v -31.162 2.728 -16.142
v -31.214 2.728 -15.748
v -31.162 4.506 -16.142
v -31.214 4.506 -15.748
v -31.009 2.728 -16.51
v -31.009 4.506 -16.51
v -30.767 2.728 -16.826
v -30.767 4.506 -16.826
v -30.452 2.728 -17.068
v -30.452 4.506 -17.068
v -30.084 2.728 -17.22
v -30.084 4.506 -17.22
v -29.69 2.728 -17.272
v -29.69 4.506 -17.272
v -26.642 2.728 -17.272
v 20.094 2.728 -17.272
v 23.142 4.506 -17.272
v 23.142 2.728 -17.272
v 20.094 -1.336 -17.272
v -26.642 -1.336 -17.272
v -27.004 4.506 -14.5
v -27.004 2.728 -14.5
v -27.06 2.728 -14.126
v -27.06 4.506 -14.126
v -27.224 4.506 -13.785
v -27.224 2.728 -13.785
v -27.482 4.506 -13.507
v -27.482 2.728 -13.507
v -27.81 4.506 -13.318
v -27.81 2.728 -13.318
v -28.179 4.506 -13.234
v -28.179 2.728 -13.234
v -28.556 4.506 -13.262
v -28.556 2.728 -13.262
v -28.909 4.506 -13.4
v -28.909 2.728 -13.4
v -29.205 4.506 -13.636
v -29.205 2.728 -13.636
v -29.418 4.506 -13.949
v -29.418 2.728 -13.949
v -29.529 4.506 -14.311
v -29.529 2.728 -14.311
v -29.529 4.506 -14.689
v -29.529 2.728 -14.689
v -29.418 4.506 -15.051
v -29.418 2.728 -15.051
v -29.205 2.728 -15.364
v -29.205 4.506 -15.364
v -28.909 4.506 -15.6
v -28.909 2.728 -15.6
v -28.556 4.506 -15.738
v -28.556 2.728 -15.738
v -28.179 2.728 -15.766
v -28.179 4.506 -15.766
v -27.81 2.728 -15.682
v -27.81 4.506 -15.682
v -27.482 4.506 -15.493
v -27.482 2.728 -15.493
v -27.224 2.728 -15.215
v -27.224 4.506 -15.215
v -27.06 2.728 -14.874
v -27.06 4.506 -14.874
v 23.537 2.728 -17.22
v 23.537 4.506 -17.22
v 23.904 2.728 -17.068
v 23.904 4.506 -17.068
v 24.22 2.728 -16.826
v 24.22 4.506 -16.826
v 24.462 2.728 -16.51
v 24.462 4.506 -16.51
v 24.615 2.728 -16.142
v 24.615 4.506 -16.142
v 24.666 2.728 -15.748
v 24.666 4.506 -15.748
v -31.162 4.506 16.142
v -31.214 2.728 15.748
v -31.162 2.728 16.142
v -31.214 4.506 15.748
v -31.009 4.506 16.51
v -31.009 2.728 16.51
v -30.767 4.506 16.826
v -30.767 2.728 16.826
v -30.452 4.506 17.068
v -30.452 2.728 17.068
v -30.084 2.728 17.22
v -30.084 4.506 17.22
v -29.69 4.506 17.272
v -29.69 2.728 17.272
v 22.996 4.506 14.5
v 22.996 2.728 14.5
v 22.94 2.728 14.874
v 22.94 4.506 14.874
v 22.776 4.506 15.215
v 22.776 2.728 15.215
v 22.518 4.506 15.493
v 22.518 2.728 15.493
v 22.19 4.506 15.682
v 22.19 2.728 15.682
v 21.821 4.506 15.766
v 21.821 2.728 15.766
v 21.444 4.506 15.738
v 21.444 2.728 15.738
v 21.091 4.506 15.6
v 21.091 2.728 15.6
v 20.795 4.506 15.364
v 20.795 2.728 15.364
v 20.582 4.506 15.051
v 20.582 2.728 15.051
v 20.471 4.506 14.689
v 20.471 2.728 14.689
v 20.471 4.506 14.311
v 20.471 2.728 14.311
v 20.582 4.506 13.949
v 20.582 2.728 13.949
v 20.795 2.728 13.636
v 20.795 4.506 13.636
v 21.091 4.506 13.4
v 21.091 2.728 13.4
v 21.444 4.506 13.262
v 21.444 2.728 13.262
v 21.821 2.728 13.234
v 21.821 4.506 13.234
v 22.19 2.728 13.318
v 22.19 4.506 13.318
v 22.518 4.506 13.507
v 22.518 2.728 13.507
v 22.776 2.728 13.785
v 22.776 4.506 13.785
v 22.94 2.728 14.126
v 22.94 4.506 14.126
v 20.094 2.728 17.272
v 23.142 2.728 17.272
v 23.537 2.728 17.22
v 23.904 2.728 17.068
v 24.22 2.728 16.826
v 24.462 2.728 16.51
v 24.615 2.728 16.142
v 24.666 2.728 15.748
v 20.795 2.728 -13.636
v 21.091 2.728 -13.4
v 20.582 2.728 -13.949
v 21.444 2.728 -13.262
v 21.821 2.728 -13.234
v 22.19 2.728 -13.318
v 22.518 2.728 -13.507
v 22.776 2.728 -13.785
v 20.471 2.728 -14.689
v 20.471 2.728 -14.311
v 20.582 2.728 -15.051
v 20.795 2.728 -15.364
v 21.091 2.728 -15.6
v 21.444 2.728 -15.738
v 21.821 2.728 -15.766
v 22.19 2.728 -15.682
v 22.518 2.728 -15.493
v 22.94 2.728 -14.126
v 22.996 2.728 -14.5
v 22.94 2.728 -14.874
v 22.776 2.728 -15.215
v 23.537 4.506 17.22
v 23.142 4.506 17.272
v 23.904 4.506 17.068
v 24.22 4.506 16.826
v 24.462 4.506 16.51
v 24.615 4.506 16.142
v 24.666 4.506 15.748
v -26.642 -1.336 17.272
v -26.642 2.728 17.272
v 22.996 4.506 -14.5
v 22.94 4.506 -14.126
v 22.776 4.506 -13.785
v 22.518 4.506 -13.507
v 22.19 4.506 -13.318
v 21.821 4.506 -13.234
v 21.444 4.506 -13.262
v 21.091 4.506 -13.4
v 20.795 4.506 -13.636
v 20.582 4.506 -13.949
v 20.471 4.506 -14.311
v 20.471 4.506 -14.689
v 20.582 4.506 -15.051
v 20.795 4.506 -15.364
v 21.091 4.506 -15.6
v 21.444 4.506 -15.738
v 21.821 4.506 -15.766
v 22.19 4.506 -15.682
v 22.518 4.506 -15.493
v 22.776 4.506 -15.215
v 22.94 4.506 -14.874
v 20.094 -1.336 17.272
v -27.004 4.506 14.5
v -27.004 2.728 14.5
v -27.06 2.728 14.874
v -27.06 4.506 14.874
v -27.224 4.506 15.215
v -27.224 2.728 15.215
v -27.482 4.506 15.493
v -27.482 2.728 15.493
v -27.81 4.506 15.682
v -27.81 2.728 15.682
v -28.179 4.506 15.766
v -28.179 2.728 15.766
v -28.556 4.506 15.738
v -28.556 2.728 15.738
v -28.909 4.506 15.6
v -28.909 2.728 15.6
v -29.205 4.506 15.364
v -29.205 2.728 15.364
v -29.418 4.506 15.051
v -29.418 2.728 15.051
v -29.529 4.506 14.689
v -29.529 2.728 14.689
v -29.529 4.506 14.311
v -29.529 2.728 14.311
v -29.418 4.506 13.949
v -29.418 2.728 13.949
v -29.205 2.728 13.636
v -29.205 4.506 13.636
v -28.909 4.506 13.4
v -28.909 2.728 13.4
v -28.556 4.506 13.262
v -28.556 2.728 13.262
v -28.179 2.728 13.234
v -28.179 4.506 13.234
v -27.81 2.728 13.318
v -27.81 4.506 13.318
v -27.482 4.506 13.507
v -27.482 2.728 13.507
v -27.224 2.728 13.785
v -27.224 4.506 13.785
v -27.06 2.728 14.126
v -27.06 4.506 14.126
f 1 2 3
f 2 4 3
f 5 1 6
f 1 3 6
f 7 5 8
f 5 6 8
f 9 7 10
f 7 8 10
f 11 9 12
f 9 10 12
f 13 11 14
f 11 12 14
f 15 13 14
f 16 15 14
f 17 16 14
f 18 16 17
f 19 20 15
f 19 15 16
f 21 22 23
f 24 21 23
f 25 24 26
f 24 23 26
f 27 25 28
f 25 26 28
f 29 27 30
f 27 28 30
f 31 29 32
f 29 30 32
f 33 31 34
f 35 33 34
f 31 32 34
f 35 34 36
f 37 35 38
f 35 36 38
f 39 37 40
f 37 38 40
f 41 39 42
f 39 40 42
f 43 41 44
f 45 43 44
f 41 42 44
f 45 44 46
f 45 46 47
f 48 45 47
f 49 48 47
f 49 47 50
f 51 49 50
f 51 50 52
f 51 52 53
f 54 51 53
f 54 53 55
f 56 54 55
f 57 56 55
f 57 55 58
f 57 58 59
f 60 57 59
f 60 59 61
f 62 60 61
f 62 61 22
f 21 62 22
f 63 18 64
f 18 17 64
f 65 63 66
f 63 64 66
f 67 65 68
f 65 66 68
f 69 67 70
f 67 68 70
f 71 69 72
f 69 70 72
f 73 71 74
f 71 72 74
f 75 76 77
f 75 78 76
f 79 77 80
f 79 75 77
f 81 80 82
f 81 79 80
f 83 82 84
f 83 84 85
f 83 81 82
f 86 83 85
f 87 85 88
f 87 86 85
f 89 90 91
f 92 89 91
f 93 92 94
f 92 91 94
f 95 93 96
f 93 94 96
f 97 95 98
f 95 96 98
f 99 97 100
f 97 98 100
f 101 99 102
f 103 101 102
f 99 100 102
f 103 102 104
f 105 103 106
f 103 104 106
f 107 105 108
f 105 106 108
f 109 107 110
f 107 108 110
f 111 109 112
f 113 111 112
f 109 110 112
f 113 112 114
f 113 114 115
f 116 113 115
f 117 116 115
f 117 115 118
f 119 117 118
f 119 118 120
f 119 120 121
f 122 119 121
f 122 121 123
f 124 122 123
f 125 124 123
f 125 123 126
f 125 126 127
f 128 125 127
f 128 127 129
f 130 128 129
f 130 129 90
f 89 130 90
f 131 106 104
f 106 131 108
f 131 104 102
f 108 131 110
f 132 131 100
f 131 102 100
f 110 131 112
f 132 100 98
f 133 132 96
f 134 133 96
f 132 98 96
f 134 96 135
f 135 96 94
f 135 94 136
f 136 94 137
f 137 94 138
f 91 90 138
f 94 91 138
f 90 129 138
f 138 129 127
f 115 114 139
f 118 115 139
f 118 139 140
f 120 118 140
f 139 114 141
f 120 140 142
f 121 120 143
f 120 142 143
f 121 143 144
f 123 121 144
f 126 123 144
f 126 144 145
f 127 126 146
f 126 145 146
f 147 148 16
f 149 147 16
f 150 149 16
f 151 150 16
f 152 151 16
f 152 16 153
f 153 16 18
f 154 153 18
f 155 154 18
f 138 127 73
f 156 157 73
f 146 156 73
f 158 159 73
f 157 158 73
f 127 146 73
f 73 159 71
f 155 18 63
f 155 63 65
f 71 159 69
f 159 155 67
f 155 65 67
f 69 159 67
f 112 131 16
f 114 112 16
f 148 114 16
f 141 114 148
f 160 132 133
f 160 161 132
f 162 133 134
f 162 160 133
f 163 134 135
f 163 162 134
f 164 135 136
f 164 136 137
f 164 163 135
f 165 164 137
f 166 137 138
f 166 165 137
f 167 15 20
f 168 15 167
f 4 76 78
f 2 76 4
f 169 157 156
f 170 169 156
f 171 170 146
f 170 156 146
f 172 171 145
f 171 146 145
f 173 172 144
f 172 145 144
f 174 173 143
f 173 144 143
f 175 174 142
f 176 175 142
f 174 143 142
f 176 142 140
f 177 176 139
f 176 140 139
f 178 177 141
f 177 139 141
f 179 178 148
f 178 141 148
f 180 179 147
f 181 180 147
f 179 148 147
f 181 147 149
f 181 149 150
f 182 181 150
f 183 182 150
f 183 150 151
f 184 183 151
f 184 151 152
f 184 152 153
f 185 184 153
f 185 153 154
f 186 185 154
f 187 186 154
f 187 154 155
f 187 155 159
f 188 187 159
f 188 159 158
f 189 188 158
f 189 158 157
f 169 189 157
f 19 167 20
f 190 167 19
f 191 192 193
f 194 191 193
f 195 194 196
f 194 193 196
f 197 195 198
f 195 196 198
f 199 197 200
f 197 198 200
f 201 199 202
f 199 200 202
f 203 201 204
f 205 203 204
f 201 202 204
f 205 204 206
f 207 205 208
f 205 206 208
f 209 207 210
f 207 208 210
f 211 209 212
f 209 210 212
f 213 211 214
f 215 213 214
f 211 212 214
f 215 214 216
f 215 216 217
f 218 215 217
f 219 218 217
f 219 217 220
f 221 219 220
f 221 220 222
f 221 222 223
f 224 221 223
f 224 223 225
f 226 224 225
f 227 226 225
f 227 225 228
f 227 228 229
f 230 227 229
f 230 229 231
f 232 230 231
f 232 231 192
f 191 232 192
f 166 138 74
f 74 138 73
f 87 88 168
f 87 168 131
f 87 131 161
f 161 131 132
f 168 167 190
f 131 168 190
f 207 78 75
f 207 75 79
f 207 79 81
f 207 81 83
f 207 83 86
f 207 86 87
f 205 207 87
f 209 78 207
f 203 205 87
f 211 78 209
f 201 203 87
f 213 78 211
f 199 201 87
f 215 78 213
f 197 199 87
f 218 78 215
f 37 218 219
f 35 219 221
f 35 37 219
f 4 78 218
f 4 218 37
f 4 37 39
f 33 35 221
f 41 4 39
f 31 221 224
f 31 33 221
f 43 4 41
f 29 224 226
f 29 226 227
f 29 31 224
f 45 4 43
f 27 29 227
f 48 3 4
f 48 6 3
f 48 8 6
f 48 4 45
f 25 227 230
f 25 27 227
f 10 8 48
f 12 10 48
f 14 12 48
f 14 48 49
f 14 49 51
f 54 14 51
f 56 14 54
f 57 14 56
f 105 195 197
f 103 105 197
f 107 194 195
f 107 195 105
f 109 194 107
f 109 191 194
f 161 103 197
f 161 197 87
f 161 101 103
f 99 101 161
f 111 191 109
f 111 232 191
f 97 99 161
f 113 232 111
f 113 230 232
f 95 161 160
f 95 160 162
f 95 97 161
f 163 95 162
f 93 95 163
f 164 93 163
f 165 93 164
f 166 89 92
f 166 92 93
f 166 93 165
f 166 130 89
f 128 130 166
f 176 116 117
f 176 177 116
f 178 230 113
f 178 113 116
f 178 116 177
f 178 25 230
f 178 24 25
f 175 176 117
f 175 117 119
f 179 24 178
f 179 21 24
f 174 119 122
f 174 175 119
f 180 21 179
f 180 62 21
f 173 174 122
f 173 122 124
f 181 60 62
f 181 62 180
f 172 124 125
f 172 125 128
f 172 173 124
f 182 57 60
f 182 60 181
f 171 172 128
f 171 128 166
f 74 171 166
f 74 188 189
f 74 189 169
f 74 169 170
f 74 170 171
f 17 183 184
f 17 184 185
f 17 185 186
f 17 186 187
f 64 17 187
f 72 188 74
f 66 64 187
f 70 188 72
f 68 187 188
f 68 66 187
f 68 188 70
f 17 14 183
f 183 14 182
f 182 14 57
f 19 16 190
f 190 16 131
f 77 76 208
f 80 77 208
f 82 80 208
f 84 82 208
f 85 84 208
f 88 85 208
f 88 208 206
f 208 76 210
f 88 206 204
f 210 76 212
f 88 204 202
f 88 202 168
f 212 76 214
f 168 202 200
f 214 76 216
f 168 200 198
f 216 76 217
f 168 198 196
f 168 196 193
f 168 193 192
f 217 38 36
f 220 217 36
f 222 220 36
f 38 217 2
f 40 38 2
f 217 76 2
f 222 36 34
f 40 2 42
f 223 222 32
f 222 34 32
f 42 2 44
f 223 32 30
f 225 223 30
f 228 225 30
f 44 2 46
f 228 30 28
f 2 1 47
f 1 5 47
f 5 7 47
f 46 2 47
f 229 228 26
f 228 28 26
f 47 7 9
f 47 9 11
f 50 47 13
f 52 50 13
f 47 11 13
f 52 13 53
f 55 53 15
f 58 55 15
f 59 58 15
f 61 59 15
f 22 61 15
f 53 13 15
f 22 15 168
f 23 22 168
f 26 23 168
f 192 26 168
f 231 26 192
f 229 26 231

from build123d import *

# Parameters (mm, degrees)
SKETCH_W     = 46.736
SKETCH_H     = 34.544
PAD_DEPTH    = 4.064
SKETCH001_W  = 55.88
SKETCH001_H  = 34.544
PAD001_DEPTH = 1.778
SKETCH002_R  = 1.27
POCKET_DEPTH = 1.779
FILLET_R     = 1.524


with BuildPart() as part:
    # Sketch → Pad (new body)
    with BuildSketch(Plane.XZ):
        Rectangle(SKETCH_W, SKETCH_H)
    extrude(amount=PAD_DEPTH)

    # Sketch001 (on Face5 of Pad) → Pad001 (join)
    with BuildSketch(Plane(origin=(0, 0, 0), x_dir=(1, 0, 0), z_dir=(0, 1, 0))):
        Rectangle(SKETCH001_W, SKETCH001_H)
    extrude(amount=PAD001_DEPTH)

    # Sketch002 (on Face7 of Pad001) → Pocket (cut, through all)
    with BuildSketch(Plane.XZ):
        with Locations((25, 14.5)):
            Circle(SKETCH002_R)
        with Locations((-25, 14.5)):
            Circle(SKETCH002_R)
        with Locations((-25, -14.5)):
            Circle(SKETCH002_R)
        with Locations((25, -14.5)):
            Circle(SKETCH002_R)
    extrude(amount=-POCKET_DEPTH, mode=Mode.SUBTRACT)

    # Fillet
    fillet_edges = [part.edges().sort_by_distance(p)[0] for p in [
        (27.94, 0.889, -17.272),
        (27.94, 0.889, 17.272),
        (-27.94, 0.889, 17.272),
        (-27.94, 0.889, -17.272),
    ]]
    fillet(fillet_edges, radius=FILLET_R)


with BuildPart() as part_1:
    # Body placement: moved
    add(part.part.moved(Location((-3.273552, 2.72796, 0))))


solid = part_1.part
